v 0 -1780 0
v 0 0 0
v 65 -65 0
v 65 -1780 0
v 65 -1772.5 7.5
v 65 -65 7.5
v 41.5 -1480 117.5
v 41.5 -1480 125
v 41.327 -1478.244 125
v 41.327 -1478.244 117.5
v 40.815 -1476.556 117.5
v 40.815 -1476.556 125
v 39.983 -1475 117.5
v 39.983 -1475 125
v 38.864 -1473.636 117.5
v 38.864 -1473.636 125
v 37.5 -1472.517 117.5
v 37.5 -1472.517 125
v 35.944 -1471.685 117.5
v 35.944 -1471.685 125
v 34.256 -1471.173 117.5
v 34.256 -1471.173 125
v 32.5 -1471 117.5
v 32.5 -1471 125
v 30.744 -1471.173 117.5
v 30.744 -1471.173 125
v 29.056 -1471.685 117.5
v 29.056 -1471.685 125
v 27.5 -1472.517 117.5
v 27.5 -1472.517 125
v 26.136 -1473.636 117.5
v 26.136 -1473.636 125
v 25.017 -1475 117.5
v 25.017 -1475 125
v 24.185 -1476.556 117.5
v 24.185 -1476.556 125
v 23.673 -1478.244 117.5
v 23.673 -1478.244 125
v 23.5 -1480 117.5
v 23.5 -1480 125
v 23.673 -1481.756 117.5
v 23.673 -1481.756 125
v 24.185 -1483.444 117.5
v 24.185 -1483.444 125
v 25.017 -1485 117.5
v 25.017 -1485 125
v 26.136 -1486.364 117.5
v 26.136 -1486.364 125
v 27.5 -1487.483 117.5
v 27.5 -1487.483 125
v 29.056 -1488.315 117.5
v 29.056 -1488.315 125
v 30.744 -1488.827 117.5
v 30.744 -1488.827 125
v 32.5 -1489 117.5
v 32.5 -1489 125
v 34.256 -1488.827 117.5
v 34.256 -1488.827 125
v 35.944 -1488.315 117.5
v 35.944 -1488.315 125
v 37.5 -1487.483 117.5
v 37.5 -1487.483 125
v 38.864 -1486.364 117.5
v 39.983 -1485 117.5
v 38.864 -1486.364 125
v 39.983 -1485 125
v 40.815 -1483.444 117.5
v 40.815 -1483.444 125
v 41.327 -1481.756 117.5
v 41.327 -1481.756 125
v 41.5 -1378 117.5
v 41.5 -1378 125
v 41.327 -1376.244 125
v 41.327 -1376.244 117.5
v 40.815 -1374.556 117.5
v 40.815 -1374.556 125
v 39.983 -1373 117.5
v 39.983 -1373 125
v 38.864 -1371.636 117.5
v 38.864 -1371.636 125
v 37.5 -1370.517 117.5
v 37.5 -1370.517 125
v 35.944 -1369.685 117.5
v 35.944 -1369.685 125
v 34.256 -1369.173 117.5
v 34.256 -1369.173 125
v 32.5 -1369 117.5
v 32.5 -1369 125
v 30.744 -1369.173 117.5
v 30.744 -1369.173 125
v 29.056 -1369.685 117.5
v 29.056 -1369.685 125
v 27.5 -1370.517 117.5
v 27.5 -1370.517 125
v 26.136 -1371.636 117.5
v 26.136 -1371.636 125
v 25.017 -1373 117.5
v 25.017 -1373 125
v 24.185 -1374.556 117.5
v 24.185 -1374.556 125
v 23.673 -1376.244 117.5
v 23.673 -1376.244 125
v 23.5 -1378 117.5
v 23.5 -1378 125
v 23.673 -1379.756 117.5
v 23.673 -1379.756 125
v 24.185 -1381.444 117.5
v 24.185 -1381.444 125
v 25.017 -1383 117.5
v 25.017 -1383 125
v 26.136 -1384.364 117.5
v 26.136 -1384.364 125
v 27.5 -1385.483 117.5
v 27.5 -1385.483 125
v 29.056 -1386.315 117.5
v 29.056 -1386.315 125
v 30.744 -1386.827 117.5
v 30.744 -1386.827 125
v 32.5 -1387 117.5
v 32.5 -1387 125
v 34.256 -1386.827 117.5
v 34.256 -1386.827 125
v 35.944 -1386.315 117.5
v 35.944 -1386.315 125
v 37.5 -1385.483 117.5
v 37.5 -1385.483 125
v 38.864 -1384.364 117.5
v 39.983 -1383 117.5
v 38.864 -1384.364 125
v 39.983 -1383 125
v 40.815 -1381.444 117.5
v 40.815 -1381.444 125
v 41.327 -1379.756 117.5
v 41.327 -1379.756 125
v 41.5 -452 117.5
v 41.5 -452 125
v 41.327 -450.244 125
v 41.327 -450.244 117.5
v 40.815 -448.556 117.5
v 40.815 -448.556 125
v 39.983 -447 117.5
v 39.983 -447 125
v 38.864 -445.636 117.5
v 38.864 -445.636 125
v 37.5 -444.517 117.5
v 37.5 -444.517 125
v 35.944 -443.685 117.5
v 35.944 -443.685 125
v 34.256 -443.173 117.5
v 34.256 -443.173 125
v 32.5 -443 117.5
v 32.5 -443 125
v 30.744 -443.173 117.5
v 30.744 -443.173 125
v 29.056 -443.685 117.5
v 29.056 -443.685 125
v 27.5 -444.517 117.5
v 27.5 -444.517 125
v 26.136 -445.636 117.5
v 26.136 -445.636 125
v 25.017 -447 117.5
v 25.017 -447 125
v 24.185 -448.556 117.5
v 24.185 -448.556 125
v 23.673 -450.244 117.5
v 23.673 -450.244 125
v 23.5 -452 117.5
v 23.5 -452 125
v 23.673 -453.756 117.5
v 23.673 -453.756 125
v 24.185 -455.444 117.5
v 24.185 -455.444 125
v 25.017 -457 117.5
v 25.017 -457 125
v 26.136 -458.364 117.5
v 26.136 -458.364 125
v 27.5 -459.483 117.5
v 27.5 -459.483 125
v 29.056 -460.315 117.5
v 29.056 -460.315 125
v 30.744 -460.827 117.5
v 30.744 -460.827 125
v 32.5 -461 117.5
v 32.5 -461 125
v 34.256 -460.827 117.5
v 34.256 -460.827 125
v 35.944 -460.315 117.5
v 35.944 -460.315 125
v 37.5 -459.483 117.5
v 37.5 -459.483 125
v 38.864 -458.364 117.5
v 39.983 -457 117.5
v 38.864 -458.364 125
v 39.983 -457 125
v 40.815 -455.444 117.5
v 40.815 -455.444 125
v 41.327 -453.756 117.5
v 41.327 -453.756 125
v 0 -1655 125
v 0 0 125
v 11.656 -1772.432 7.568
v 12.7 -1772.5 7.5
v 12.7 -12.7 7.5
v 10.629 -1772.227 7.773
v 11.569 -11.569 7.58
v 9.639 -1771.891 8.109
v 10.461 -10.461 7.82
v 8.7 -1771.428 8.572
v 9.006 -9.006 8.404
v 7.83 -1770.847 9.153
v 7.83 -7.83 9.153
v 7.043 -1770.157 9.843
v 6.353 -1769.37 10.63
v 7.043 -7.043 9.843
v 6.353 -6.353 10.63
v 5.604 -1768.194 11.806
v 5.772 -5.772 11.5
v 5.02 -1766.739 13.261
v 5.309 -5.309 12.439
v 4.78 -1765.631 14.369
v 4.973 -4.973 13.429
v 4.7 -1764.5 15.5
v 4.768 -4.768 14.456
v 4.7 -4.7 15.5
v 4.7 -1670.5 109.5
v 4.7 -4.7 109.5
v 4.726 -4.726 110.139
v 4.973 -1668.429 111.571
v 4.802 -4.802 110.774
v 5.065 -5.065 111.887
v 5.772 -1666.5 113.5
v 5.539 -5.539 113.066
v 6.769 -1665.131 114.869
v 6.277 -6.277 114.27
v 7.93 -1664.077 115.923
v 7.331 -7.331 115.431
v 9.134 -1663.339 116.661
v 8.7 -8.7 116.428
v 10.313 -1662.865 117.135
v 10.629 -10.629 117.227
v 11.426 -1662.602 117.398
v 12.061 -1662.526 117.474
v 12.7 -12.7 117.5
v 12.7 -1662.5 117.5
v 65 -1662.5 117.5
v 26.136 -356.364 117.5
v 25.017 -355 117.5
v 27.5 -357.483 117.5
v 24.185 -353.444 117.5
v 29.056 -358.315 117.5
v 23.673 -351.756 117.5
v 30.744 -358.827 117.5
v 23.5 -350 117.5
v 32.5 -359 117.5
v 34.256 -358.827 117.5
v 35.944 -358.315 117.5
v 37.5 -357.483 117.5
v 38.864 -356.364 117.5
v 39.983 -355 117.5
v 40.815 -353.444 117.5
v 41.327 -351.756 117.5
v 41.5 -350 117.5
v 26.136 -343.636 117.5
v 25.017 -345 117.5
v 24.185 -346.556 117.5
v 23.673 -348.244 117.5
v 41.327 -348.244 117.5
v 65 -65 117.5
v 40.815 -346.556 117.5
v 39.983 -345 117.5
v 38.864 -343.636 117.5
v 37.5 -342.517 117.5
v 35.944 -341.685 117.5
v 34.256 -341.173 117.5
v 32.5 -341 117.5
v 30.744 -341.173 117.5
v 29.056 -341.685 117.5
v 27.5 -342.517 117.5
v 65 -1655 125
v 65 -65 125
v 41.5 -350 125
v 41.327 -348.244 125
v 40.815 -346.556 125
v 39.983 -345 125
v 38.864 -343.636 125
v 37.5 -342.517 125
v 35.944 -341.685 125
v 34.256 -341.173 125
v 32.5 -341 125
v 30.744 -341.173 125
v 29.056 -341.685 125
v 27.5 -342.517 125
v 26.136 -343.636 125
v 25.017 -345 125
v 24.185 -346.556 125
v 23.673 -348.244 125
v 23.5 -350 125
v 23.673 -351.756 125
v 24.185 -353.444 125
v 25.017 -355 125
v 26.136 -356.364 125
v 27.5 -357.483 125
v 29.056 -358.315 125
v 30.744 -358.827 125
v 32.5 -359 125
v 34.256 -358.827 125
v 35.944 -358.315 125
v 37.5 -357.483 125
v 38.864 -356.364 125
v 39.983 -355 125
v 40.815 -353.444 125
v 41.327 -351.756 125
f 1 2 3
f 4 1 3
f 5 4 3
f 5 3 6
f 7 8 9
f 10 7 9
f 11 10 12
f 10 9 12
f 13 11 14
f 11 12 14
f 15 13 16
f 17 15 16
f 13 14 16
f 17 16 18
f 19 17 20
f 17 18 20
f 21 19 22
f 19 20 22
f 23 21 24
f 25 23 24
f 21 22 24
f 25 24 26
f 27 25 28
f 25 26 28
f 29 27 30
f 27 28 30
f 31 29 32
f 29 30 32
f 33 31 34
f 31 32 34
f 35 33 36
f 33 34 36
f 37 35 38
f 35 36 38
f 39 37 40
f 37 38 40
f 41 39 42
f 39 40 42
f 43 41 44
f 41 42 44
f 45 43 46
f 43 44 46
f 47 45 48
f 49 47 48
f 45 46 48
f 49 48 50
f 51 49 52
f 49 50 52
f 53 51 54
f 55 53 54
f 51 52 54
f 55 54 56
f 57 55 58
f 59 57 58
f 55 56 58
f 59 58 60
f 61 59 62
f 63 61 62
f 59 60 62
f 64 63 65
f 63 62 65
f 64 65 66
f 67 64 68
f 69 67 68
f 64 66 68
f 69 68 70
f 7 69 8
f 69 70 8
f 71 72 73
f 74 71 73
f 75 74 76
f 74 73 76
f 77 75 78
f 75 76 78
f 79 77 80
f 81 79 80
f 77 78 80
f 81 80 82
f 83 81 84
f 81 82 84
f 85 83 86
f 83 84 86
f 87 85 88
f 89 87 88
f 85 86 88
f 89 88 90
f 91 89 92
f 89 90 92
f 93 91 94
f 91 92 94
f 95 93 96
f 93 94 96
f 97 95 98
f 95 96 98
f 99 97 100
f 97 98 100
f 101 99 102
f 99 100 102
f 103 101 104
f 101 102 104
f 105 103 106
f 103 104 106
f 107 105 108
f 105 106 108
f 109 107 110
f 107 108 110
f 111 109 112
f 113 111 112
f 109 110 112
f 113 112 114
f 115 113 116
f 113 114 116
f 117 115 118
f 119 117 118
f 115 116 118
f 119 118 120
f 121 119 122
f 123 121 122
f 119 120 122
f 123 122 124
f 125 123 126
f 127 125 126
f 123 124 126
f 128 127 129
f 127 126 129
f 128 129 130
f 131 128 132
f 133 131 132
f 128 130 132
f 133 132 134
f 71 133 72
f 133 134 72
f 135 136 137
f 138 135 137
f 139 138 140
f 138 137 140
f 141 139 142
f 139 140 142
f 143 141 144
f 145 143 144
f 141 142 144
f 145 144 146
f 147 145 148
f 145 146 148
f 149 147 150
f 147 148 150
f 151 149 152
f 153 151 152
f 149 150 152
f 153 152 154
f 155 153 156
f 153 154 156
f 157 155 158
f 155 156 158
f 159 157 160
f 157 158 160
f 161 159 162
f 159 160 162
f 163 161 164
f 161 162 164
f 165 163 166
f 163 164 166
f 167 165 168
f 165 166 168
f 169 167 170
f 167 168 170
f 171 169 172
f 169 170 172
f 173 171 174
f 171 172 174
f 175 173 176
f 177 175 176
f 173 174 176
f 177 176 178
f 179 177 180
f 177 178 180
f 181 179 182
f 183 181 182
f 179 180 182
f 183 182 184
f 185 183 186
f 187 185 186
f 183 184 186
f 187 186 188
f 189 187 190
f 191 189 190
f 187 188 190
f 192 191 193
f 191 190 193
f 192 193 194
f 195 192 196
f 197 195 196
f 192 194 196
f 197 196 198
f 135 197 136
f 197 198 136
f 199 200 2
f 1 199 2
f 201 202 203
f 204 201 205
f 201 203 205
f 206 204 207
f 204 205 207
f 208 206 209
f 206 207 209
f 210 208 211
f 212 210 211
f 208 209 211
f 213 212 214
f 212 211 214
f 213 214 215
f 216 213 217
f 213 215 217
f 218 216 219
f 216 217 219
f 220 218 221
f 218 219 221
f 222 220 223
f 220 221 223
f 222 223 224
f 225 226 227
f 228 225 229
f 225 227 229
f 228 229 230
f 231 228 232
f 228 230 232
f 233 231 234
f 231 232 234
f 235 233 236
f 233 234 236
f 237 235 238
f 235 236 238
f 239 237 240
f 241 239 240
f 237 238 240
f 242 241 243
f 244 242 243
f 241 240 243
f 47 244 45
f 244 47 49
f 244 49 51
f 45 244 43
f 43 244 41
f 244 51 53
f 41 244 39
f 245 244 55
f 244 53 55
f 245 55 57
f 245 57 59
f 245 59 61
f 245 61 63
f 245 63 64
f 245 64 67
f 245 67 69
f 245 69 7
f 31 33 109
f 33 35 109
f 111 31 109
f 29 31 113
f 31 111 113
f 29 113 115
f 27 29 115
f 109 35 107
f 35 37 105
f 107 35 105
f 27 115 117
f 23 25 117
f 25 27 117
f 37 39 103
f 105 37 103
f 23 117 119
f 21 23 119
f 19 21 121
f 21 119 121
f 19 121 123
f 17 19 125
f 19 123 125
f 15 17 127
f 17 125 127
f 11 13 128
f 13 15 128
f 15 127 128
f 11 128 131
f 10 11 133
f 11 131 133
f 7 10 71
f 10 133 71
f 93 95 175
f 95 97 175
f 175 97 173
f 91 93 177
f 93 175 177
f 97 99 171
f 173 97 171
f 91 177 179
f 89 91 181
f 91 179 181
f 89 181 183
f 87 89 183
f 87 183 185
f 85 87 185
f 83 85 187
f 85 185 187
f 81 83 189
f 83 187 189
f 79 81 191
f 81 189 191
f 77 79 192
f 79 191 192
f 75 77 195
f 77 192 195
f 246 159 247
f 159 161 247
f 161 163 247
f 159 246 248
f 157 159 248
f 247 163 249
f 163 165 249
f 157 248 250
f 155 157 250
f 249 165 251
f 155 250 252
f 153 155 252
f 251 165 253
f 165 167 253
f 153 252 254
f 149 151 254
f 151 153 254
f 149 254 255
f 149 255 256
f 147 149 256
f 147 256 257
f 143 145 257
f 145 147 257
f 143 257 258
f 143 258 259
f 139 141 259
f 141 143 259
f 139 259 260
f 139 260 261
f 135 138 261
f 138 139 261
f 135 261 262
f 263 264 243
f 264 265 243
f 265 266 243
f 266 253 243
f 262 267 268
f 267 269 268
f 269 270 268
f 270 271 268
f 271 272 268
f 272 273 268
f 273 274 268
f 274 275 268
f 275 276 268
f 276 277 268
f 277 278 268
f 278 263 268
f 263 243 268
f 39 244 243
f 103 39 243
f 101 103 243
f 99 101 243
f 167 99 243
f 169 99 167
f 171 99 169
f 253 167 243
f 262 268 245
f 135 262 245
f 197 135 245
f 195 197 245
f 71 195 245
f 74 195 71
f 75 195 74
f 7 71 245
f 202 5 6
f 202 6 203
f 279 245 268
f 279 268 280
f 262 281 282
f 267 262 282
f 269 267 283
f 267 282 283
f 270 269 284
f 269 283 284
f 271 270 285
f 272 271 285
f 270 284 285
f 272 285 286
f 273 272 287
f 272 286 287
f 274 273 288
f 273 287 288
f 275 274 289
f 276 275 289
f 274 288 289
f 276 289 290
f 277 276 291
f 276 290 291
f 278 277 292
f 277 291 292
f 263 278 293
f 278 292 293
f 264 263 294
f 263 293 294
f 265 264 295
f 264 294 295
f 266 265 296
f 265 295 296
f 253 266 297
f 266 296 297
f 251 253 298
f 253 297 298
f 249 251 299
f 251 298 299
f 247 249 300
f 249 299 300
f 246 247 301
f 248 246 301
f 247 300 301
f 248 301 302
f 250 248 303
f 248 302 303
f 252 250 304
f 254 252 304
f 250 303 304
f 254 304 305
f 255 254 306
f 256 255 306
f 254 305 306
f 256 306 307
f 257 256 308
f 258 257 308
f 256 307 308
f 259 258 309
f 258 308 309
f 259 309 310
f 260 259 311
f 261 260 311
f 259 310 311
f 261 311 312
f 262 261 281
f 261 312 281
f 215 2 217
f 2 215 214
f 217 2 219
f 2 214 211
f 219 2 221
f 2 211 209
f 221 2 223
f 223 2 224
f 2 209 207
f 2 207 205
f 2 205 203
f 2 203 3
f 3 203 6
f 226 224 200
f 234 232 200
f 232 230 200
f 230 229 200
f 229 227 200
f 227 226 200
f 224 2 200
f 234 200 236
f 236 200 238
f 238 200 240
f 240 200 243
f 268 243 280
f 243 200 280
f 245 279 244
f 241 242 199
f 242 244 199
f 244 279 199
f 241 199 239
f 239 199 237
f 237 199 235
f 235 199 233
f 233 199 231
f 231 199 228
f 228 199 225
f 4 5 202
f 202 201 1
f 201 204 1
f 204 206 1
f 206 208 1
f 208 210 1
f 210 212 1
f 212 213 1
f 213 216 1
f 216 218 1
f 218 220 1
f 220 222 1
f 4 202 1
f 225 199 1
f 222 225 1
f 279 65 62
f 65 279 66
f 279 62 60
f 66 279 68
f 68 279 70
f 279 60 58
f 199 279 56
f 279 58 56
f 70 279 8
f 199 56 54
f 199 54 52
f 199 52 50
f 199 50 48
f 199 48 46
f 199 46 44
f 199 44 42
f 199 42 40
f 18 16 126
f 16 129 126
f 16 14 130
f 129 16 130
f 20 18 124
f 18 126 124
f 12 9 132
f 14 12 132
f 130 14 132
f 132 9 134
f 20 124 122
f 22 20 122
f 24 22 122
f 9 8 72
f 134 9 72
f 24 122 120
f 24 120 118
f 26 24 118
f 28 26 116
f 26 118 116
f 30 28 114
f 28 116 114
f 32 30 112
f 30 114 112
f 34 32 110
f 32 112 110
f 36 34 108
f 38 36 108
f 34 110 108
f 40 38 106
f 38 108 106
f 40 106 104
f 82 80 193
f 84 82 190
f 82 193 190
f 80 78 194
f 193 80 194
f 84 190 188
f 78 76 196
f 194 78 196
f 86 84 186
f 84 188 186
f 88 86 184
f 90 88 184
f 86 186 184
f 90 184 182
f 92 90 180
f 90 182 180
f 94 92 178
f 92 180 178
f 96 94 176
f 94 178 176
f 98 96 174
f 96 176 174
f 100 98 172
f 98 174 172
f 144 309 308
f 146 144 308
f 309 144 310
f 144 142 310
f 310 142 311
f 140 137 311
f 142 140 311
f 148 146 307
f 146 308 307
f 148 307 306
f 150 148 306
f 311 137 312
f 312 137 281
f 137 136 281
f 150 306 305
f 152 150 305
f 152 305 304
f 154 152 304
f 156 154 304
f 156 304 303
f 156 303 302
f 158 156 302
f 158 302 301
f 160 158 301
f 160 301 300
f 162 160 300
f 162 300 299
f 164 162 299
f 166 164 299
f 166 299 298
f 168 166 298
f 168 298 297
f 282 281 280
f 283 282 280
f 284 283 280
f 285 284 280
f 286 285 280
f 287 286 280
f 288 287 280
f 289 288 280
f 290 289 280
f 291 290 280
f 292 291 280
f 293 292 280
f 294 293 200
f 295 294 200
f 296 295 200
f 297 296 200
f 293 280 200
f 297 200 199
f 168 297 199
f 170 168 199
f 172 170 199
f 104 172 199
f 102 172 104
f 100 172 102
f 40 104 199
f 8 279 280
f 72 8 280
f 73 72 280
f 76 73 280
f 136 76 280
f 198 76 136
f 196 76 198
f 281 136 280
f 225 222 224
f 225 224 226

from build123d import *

# Parameters (mm, degrees)
F1_DEPTH = 1780
F3_DEPTH = 125.001
F5_DEPTH = 65.001
F6_R     = 9
F7_DEPTH = 7.5
F8_R     = 9
F9_DEPTH = 7.5


with BuildPart() as f1:
    # F0 (on Front) → F1 (new body)
    with BuildSketch(Plane.XZ):
        with BuildLine():
            Line((0, 125), (0, 0))
            Line((0, 0), (65, 0))
            Line((65, 0), (65, 7.5))
            Line((65, 7.5), (12.7, 7.5))
            ThreePointArc((12.7, 7.5), (7.043146, 9.843146), (4.7, 15.5))
            Line((4.7, 15.5), (4.7, 109.5))
            ThreePointArc((4.7, 109.5), (7.043146, 115.156854), (12.7, 117.5))
            Line((12.7, 117.5), (65, 117.5))
            Line((65, 117.5), (65, 125))
            Line((65, 125), (0, 125))
        make_face()
    extrude(amount=F1_DEPTH)

    # F2 (on face) → F3 (cut, through all)
    with BuildSketch(Plane.XY.offset(125)):
        Polygon((65, -65), (65, 0), (0, 0), align=None)
    extrude(amount=-F3_DEPTH, mode=Mode.SUBTRACT)

    # F4 (on face) → F5 (cut, through all)
    with BuildSketch(Plane(origin=(0, 0, 0), x_dir=(0, -1, 0), z_dir=(-1, 0, 0))):
        Polygon((1780, 0), (1780, 125), (1655, 125), align=None)
    extrude(amount=-F5_DEPTH, mode=Mode.SUBTRACT)

    # F6 (on face) → F7 (cut, through all)
    with BuildSketch(Plane.XY.offset(125)):
        with Locations((32.5, -350)):
            Circle(F6_R)
        with Locations((32.5, -452)):
            Circle(F6_R)
    extrude(amount=-F7_DEPTH, mode=Mode.SUBTRACT)

    # F8 (on face) → F9 (cut, through all)
    with BuildSketch(Plane.XY.offset(125)):
        with Locations((32.5, -1378)):
            Circle(F8_R)
        with Locations((32.5, -1480)):
            Circle(F8_R)
    extrude(amount=-F9_DEPTH, mode=Mode.SUBTRACT)


solid = f1.part
